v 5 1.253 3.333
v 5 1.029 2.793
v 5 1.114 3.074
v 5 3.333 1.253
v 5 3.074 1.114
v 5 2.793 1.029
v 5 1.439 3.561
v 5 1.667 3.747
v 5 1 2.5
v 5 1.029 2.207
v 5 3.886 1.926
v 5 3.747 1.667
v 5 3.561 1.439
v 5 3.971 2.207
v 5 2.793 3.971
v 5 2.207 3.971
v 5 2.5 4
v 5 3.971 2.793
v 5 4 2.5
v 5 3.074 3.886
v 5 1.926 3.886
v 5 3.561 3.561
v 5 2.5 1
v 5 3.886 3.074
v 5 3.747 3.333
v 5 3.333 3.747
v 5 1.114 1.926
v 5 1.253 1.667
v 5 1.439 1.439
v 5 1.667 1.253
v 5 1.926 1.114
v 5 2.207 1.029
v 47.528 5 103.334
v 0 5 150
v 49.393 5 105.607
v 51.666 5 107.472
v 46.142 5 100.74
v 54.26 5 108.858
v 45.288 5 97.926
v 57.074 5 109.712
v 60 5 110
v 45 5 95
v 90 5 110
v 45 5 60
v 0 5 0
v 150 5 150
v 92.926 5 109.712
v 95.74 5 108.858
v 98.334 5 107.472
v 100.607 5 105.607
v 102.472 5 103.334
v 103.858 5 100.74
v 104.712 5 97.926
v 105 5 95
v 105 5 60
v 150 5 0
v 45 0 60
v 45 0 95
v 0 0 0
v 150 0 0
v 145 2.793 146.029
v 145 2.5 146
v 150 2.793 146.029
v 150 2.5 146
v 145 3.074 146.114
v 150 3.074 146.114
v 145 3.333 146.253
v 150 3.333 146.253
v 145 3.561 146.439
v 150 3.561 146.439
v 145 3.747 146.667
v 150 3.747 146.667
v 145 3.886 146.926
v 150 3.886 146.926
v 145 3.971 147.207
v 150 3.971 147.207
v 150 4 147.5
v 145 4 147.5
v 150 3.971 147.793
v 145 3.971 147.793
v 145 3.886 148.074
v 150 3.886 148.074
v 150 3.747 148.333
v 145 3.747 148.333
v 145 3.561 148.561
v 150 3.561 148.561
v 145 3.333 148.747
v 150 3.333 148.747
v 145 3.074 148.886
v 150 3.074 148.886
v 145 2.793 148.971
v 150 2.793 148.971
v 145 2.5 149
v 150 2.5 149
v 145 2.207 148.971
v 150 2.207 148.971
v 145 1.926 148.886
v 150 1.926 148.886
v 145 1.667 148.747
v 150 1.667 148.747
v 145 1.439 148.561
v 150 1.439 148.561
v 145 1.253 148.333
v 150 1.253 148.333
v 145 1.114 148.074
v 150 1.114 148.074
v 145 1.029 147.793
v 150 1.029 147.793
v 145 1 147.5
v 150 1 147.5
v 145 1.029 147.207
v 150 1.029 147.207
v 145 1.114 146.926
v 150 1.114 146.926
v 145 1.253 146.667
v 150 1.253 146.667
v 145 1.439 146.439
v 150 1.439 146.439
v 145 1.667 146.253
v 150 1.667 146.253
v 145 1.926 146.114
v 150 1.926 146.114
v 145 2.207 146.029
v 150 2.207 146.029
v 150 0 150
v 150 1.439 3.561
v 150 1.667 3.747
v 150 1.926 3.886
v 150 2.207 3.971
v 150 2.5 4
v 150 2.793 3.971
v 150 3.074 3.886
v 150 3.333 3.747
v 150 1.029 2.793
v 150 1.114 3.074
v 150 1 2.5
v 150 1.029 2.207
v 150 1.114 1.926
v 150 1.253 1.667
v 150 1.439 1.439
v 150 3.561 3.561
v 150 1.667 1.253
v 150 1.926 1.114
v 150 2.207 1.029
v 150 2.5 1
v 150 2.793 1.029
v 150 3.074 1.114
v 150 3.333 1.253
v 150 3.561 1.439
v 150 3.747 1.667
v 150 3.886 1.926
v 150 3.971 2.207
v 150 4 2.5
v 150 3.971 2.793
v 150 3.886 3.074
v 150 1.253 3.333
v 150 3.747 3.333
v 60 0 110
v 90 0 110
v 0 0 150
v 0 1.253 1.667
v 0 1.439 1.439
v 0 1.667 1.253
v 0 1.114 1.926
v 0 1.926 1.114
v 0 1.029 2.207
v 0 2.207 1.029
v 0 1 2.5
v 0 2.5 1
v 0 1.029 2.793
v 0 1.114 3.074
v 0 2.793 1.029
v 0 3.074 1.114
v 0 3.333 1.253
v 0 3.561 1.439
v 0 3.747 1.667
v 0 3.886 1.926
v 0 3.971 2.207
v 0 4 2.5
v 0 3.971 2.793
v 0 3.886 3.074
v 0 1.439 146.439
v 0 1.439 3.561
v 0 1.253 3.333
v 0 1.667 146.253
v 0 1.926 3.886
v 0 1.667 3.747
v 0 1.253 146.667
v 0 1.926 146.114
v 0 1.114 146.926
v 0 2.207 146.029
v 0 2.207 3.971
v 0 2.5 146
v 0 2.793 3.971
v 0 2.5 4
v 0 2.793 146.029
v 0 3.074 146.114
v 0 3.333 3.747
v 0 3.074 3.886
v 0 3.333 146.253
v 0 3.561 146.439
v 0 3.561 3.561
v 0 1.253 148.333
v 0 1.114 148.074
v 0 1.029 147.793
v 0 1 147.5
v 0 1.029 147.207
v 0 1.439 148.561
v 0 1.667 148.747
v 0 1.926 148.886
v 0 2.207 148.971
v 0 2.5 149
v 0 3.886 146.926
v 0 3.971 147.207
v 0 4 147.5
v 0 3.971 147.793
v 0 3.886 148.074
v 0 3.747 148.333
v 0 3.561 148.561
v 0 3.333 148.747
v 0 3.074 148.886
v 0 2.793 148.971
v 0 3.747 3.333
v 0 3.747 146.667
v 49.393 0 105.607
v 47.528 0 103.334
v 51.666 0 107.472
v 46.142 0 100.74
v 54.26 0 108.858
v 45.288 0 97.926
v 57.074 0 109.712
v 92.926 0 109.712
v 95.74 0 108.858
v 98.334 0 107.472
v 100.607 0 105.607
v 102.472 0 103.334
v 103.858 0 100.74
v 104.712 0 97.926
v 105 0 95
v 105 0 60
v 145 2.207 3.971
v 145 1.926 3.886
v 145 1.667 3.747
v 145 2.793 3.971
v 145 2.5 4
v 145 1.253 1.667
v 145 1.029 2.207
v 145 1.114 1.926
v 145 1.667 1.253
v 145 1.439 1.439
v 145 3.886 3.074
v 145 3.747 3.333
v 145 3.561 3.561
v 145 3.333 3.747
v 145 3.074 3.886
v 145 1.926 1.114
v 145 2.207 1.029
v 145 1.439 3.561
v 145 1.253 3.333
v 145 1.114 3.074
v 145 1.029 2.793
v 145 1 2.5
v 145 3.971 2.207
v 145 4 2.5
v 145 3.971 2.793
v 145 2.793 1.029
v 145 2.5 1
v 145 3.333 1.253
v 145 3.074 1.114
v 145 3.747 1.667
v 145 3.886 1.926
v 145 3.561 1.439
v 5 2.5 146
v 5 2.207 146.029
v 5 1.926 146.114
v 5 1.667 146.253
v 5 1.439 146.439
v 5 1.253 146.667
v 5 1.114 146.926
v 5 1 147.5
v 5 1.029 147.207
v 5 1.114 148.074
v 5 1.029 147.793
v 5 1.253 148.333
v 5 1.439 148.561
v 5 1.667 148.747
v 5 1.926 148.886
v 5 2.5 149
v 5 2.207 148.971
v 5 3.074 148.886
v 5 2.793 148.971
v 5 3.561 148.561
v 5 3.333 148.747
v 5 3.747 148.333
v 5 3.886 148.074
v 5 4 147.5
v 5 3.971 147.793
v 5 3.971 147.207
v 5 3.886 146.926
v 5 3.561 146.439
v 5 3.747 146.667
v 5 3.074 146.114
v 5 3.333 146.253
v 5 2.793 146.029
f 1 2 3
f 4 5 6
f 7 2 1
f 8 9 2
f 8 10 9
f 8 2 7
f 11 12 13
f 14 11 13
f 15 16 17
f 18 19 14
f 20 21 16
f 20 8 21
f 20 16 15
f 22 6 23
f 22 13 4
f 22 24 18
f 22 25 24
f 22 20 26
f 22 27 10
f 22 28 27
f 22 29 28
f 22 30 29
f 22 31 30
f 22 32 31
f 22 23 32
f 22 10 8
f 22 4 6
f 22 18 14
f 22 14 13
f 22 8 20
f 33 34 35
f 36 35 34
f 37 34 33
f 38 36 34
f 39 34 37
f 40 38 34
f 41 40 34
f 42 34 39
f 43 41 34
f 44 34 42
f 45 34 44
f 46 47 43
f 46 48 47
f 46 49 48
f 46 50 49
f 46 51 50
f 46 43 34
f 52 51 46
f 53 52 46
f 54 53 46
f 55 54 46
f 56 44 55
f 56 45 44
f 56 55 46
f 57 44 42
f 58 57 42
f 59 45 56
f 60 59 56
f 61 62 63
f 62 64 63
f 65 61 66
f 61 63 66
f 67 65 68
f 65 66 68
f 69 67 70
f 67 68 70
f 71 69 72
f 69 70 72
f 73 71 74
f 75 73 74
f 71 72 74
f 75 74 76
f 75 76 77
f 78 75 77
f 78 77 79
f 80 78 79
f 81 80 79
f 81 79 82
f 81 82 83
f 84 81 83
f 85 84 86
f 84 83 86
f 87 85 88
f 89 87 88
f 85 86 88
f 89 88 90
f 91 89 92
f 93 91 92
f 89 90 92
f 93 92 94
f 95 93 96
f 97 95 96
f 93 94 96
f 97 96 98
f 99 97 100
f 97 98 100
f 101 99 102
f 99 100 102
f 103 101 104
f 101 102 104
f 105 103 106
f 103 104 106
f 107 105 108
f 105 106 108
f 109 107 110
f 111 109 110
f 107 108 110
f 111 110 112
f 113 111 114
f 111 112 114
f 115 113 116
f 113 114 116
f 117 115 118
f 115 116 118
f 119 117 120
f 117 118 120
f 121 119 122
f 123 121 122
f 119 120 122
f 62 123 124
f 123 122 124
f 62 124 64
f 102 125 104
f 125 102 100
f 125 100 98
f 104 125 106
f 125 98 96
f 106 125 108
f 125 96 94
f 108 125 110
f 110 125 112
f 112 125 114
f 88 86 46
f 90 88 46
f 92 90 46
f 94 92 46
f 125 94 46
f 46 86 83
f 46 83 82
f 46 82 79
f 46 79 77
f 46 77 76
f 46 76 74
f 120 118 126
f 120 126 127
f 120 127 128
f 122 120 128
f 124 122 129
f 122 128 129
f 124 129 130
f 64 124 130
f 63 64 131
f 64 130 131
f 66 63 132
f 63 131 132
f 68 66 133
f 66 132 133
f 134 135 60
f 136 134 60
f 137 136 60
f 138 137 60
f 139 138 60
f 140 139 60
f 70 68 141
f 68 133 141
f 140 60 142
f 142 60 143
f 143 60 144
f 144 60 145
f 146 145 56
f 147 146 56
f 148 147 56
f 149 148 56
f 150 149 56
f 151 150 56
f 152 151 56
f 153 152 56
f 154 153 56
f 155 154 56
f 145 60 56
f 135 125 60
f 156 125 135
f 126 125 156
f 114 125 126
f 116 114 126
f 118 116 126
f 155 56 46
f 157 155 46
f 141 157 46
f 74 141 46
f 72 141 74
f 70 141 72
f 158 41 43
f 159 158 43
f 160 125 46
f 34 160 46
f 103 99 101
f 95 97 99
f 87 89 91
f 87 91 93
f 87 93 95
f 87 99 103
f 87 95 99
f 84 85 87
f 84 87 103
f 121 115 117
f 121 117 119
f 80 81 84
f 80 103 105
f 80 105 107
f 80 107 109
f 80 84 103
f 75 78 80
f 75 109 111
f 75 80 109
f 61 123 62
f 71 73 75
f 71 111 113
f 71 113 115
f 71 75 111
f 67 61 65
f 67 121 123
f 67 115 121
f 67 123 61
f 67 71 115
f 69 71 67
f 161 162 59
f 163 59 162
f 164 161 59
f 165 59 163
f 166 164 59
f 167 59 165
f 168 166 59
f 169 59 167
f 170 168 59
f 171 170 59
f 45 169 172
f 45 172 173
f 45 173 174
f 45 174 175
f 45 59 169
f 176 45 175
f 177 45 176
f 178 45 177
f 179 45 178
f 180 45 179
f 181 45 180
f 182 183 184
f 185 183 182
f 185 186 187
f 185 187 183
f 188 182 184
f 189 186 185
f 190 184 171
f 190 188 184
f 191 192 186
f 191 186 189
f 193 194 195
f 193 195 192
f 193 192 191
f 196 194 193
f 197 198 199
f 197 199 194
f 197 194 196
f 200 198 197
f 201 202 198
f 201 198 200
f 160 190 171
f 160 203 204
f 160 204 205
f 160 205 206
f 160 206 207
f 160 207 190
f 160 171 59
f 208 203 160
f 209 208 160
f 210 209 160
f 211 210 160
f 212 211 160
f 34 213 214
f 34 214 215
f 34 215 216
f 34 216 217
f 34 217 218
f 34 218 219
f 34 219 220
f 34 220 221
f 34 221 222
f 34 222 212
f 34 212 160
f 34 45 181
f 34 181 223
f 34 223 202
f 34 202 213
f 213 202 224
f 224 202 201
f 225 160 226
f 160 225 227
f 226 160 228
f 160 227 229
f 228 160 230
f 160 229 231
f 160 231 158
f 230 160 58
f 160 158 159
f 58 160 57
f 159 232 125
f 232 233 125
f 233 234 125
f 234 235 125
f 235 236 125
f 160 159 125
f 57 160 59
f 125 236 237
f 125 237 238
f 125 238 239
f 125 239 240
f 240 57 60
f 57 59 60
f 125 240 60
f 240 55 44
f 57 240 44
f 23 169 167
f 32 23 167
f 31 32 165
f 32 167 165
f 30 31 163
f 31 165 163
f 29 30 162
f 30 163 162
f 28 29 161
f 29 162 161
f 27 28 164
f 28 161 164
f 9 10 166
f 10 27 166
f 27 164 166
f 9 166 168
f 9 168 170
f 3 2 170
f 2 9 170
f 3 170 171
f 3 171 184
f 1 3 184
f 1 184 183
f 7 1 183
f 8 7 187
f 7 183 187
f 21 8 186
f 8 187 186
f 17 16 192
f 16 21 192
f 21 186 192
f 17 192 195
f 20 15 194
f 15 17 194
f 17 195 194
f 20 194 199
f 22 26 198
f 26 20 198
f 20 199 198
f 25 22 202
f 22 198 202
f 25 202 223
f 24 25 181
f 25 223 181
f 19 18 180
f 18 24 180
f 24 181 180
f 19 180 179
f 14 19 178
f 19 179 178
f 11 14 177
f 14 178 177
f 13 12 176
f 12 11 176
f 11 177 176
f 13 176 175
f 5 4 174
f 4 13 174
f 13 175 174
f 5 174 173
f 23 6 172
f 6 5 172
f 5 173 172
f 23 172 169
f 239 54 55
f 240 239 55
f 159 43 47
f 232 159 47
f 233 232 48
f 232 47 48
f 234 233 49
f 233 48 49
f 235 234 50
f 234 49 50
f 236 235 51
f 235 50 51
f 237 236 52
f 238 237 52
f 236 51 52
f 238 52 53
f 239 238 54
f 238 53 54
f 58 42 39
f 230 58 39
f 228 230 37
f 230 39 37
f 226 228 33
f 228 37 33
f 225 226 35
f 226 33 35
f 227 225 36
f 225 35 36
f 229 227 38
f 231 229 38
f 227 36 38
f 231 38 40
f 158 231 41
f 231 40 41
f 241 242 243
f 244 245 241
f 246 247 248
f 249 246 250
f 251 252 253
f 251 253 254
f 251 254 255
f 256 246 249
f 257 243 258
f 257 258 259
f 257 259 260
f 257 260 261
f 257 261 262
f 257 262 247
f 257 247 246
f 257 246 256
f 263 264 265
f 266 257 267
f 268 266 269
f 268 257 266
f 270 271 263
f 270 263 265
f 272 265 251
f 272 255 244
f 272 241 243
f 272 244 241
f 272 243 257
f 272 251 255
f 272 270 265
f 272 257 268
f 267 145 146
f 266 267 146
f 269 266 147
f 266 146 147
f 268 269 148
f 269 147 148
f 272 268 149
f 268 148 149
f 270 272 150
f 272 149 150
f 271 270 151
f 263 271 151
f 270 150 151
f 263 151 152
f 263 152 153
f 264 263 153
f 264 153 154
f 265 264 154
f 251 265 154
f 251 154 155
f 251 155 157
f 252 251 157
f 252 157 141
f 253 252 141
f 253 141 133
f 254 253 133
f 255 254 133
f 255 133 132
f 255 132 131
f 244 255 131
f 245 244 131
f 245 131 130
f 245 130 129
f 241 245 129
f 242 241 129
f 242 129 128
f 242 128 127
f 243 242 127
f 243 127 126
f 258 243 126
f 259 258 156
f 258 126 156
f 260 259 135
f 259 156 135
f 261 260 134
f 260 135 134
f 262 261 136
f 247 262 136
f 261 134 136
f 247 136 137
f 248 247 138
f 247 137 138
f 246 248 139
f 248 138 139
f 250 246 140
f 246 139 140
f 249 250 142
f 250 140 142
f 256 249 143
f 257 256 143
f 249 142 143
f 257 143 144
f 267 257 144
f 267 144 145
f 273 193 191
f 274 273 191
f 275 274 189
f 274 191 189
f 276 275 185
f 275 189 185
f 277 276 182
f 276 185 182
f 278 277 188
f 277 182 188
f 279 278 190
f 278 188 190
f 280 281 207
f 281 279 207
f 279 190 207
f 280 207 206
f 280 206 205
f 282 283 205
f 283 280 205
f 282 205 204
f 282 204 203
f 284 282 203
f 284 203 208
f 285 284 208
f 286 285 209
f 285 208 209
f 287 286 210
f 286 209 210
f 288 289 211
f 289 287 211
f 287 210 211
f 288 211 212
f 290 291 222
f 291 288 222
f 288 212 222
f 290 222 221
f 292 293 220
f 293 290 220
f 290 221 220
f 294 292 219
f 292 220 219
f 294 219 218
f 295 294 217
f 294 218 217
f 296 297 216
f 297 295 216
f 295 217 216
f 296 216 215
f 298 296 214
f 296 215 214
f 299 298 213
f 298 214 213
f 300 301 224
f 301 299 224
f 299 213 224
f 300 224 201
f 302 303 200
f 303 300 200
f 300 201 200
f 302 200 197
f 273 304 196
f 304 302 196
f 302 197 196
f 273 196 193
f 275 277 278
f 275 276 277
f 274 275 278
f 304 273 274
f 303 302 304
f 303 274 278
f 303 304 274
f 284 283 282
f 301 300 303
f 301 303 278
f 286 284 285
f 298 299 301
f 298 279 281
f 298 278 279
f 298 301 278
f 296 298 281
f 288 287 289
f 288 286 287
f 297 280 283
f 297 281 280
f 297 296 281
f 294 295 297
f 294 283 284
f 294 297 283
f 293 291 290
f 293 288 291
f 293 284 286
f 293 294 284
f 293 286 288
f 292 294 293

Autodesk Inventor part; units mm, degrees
sketch "Boceto1" plane through (0, 0, 0) normal (0, 0, 1) x (1, 0, 0)
  line L0 (0, 0) -> (150, 0)
  line L1 (150, 0) -> (150, 150)
  line L2 (150, 150) -> (0, 150)
  line L3 (0, 150) -> (0, 0)
  line L4 (5, 145) -> (145, 145)
  line L5 (145, 145) -> (145, 5)
  line L6 (145, 5) -> (5, 5)
  line L7 (5, 5) -> (5, 145)
  dimension "d0" = 150
  dimension "d1" = 150
  dimension "d2" = 5
extrude "Extrusión1" add sketch "Boceto1" along normal blind 150
sketch "Boceto2" plane through (150, 0, 0) normal (1, 0, 0) x (0, 0, -1)
  line L0 (-150, 0) -> (-150, 150) projected
  line L1 (-150, 75) -> (-190, 75) construction
  line L2 (-190, 75) -> (-150, 150)
  line L3 (0, 0) -> (-150, 0) construction
  line L4 (-150, 0) -> (-190, 75)
  dimension "d5" = 40
extrude "Extrusión2" add sketch "Boceto2" against normal blind 5
ref_plane "Plano de trabajo1" through (75, 0, 0) normal (1, 0, 0) x (0, 0, -1)
mirror "Simetría1" about plane through (75, 0, 0) normal (1, 0, 0) of "Extrusión2"
sketch "Boceto3" plane through (0, 150, 0) normal (0, 1, 0) x (1, 0, 0)
  line L0 (105, -60) -> (45, -60)
  line L1 (45, -60) -> (45, -95)
  line L2 (60, -110) -> (90, -110)
  line L3 (105, -95) -> (105, -60)
  line L4 (150, 0) -> (0, 0) projected
  line L5 (145, -150) -> (5, -150) projected
  arc A0 (90, -110) -> (105, -95) centre (90, -95) ccw
  arc A1 (45, -95) -> (60, -110) centre (60, -95) ccw
  point P0 (45, -110)
  point P1 (105, -110)
  point P2 (75, -60)
  point P3 (75, 0)
  dimension "d8" = 60
  dimension "d9" = 50
  dimension "d10" = 40
  dimension "d11" = 15
extrude "Extrusión3" cut sketch "Boceto3" against normal through all
sketch "Boceto4" plane through (150, 0, 0) normal (1, 0, 0) x (0, 0, -1)
  line L0 (-13, 20) -> (-123, 20)
  line L1 (-128, 25) -> (-128, 75)
  line L2 (-123, 80) -> (-13, 80)
  line L3 (-8, 75) -> (-8, 25)
  line L4 (0, 0) -> (0, 150) projected
  line L5 (0, 0) -> (-150, 0) projected
  arc A0 (-123, 80) -> (-128, 75) centre (-123, 75) ccw
  arc A1 (-8, 75) -> (-13, 80) centre (-13, 75) ccw
  arc A2 (-13, 20) -> (-8, 25) centre (-13, 25) ccw
  arc A3 (-128, 25) -> (-123, 20) centre (-123, 25) ccw
  point P0 (-128, 80)
  point P1 (-128, 20)
  point P2 (-8, 80)
  dimension "d14" = 120
  dimension "d15" = 60
  dimension "d16" = 8
  dimension "d17" = 20
  dimension "d18" = 5
extrude "Extrusión4" cut sketch "Boceto4" against normal up to surface (5 mm away)
sketch "Boceto5" plane through (0, 0, 0) normal (-1, 0, 0) x (0, 0, 1)
  line L0 (65, 125) -> (115, 125)
  line L1 (120, 120) -> (120, 30)
  line L2 (115, 25) -> (65, 25)
  line L3 (60, 30) -> (60, 120)
  line L4 (0, 150) -> (0, 0) projected
  arc A0 (120, 120) -> (115, 125) centre (115, 120) ccw
  arc A1 (115, 25) -> (120, 30) centre (115, 30) ccw
  arc A2 (65, 125) -> (60, 120) centre (65, 120) ccw
  arc A3 (60, 30) -> (65, 25) centre (65, 30) ccw
  point P0 (60, 150)
  point P1 (120, 25)
  point P2 (120, 125)
  point P3 (60, 25)
  point P4 (60, 75)
  point P5 (0, 75)
  dimension "d21" = 60
  dimension "d22" = 100
  dimension "d23" = 60
  dimension "d24" = 5
extrude "Extrusión5" cut sketch "Boceto5" against normal blind 10
sketch "Boceto6" plane through (150, 0, 0) normal (1, 0, 0) x (0, 0, -1)
  line L0 (-190, 75) -> (-150, 0) projected
  line L1 (-150, 150) -> (-190, 75) projected
  line L2 (-154.4118, 152.3529) -> (-195.6667, 75)
  line L3 (-195.6667, 75) -> (-154.4118, -2.3529)
  line L4 (-154.4118, 152.3529) -> (-144.4118, 152.3529)
  line L5 (-144.4118, 152.3529) -> (-144.4118, 150)
  line L6 (-154.4118, -2.3529) -> (-144.4118, -2.3529)
  line L7 (-144.4118, -2.3529) -> (-144.4118, 0)
  line L8 (0, 0) -> (-150, 0) projected
  line L9 (0, 150) -> (-150, 150) projected
  dimension "d27" = 5
  dimension "d28" = 10
extrude "Extrusión6" add sketch "Boceto6" along normal blind 10 and the other way blind 160
fillet "Empalme1" radius 5 3 edges at (75, 152.3529, 154.4118) (75, 75, 195.6667) (75, -2.3529, 154.4118)
sketch "Boceto7" plane through (150, 25, 8) normal (0, 0, 1) x (1, 0, 0)
  circle A0 centre (-2.5, 2.5) radius 1.25
  line L0 (0, 50) -> (0, 0) projected
  line L1 (0, 0) -> (-5, 0) projected
  point P0 (-150, -25)
  point P1 (-2.5, 0)
  dimension "d34" = 2.5
  dimension "d35" = 2.5
  dimension "d36" = 2.5
extrude "Extrusión7" cut sketch "Boceto7" against normal blind 3
ref_plane "Plano de trabajo2" through (150, 25, 68) normal (0, 0, 1) x (1, 0, 0)
mirror "Simetría2" about plane through (150, 25, 68) normal (0, 0, 1) of "Extrusión7"
sketch "Boceto8" plane through (160, 0, 0) normal (1, 0, 0) x (0, 0, -1)
  arc A0 (-155.8235, 0.2941) -> (-151.4118, -2.3529) centre (-151.4118, 2.6471) ccw projected
  line L0 (-151.4118, -2.3529) -> (-144.4118, -2.3529) projected
  line L1 (-144.4118, -2.3529) -> (-144.4118, 0) projected
  line L2 (-144.4118, 0) -> (-150, 0) projected
  line L3 (-150, 0) -> (-190, 75) projected
  line L4 (-190, 75) -> (-150, 150) projected
  line L5 (-150, 150) -> (-144.4118, 150) projected
  line L6 (-144.4118, 150) -> (-144.4118, 152.3529) projected
  line L7 (-144.4118, 152.3529) -> (-151.4118, 152.3529) projected
  arc A1 (-151.4118, 152.3529) -> (-155.8235, 149.7059) centre (-151.4118, 147.3529) ccw projected
  line L8 (-155.8235, 149.7059) -> (-194.4118, 77.3529) projected
  arc A2 (-194.4118, 77.3529) -> (-194.4118, 72.6471) centre (-190, 75) ccw projected
  line L9 (-194.4118, 72.6471) -> (-155.8235, 0.2941) projected
  point P0 (0, 0)
extrude "Extrusión8" cut sketch "Boceto8" against normal through all
sketch "Boceto9" plane through (145, 0, 150) normal (0, -0.4705882, 0.8823529) x (1, 0, 0)
  circle A0 centre (2.5, 2.5) radius 1.5
  line L0 (5, 85) -> (5, 0) projected
  line L1 (5, 0) -> (0, 0) projected
  point P0 (-145, -70.5882)
  dimension "d41" = 3
  dimension "d42" = 2.5
  dimension "d43" = 2.5
ref_plane "Plano de trabajo3" through (75, 0, 0) normal (1, 0, 0) x (0, 0, -1)
ref_plane "Plano de trabajo4" through (0, 75, 0) normal (0, -1, 0) x (1, 0, 0)
mirror "Simetría4" about plane through (0, 75, 0) normal (0, -1, 0) of "Extrusión8"
sketch "Boceto10" plane through (0, 150, 0) normal (0, 1, 0) x (1, 0, 0)
  line L0 (5, -115) -> (5, -65) projected
  arc A0 (45, -95) -> (60, -110) centre (60, -95) ccw projected
  line L1 (45, -95) -> (45, -60) projected
  line L2 (45, -60) -> (105, -60) projected
  line L3 (105, -60) -> (105, -95) projected
  arc A1 (90, -110) -> (105, -95) centre (90, -95) ccw projected
  line L4 (90, -110) -> (60, -110) projected
  line L5 (150, 0) -> (150, -150) projected
  line L6 (150, 0) -> (0, 0) projected
  line L7 (0, 0) -> (0, -150) projected
  line L8 (5, -150) -> (0, -150) projected
  line L9 (145, -150) -> (5, -150) projected
  line L10 (150, -150) -> (145, -150) projected
extrude "Extrusión10" cut sketch "Boceto10" against normal up to surface (145 mm away)
sketch "Boceto11" plane through (150, 0, 150) normal (1, 0, 0) x (0, 0, -1)
  line L0 (0, 0) -> (0, 5) projected
  line L1 (0, 5) -> (0, 150) projected
  line L2 (-40, 75) -> (0, 0) projected
  line L3 (0, 150) -> (-40, 75) projected
  point P0 (150, 0)
extrude "Extrusión11" cut sketch "Boceto11" against normal through all
sketch "Boceto12" plane through (150, 0, 0) normal (1, 0, 0) x (0, 0, -1)
  circle A0 centre (-147.5, 2.5) radius 1.5
  line L0 (0, 5) -> (-150, 5) projected
  line L1 (-150, 5) -> (-150, 0) projected
  line L2 (-75, 5) -> (-75, -25.1445) construction
  circle A1 centre (-2.5, 2.5) radius 1.5
  point P0 (0, 0)
  dimension "d50" = 3
  dimension "d51" = 2.5
  dimension "d52" = 2.5
extrude "Extrusión12" cut sketch "Boceto12" against normal blind 5
mirror "Simetría5" about plane through (75, 0, 0) normal (1, 0, 0) of "Extrusión12"
properties part number "CasaJugueteAPM" material "Plástico ABS"
